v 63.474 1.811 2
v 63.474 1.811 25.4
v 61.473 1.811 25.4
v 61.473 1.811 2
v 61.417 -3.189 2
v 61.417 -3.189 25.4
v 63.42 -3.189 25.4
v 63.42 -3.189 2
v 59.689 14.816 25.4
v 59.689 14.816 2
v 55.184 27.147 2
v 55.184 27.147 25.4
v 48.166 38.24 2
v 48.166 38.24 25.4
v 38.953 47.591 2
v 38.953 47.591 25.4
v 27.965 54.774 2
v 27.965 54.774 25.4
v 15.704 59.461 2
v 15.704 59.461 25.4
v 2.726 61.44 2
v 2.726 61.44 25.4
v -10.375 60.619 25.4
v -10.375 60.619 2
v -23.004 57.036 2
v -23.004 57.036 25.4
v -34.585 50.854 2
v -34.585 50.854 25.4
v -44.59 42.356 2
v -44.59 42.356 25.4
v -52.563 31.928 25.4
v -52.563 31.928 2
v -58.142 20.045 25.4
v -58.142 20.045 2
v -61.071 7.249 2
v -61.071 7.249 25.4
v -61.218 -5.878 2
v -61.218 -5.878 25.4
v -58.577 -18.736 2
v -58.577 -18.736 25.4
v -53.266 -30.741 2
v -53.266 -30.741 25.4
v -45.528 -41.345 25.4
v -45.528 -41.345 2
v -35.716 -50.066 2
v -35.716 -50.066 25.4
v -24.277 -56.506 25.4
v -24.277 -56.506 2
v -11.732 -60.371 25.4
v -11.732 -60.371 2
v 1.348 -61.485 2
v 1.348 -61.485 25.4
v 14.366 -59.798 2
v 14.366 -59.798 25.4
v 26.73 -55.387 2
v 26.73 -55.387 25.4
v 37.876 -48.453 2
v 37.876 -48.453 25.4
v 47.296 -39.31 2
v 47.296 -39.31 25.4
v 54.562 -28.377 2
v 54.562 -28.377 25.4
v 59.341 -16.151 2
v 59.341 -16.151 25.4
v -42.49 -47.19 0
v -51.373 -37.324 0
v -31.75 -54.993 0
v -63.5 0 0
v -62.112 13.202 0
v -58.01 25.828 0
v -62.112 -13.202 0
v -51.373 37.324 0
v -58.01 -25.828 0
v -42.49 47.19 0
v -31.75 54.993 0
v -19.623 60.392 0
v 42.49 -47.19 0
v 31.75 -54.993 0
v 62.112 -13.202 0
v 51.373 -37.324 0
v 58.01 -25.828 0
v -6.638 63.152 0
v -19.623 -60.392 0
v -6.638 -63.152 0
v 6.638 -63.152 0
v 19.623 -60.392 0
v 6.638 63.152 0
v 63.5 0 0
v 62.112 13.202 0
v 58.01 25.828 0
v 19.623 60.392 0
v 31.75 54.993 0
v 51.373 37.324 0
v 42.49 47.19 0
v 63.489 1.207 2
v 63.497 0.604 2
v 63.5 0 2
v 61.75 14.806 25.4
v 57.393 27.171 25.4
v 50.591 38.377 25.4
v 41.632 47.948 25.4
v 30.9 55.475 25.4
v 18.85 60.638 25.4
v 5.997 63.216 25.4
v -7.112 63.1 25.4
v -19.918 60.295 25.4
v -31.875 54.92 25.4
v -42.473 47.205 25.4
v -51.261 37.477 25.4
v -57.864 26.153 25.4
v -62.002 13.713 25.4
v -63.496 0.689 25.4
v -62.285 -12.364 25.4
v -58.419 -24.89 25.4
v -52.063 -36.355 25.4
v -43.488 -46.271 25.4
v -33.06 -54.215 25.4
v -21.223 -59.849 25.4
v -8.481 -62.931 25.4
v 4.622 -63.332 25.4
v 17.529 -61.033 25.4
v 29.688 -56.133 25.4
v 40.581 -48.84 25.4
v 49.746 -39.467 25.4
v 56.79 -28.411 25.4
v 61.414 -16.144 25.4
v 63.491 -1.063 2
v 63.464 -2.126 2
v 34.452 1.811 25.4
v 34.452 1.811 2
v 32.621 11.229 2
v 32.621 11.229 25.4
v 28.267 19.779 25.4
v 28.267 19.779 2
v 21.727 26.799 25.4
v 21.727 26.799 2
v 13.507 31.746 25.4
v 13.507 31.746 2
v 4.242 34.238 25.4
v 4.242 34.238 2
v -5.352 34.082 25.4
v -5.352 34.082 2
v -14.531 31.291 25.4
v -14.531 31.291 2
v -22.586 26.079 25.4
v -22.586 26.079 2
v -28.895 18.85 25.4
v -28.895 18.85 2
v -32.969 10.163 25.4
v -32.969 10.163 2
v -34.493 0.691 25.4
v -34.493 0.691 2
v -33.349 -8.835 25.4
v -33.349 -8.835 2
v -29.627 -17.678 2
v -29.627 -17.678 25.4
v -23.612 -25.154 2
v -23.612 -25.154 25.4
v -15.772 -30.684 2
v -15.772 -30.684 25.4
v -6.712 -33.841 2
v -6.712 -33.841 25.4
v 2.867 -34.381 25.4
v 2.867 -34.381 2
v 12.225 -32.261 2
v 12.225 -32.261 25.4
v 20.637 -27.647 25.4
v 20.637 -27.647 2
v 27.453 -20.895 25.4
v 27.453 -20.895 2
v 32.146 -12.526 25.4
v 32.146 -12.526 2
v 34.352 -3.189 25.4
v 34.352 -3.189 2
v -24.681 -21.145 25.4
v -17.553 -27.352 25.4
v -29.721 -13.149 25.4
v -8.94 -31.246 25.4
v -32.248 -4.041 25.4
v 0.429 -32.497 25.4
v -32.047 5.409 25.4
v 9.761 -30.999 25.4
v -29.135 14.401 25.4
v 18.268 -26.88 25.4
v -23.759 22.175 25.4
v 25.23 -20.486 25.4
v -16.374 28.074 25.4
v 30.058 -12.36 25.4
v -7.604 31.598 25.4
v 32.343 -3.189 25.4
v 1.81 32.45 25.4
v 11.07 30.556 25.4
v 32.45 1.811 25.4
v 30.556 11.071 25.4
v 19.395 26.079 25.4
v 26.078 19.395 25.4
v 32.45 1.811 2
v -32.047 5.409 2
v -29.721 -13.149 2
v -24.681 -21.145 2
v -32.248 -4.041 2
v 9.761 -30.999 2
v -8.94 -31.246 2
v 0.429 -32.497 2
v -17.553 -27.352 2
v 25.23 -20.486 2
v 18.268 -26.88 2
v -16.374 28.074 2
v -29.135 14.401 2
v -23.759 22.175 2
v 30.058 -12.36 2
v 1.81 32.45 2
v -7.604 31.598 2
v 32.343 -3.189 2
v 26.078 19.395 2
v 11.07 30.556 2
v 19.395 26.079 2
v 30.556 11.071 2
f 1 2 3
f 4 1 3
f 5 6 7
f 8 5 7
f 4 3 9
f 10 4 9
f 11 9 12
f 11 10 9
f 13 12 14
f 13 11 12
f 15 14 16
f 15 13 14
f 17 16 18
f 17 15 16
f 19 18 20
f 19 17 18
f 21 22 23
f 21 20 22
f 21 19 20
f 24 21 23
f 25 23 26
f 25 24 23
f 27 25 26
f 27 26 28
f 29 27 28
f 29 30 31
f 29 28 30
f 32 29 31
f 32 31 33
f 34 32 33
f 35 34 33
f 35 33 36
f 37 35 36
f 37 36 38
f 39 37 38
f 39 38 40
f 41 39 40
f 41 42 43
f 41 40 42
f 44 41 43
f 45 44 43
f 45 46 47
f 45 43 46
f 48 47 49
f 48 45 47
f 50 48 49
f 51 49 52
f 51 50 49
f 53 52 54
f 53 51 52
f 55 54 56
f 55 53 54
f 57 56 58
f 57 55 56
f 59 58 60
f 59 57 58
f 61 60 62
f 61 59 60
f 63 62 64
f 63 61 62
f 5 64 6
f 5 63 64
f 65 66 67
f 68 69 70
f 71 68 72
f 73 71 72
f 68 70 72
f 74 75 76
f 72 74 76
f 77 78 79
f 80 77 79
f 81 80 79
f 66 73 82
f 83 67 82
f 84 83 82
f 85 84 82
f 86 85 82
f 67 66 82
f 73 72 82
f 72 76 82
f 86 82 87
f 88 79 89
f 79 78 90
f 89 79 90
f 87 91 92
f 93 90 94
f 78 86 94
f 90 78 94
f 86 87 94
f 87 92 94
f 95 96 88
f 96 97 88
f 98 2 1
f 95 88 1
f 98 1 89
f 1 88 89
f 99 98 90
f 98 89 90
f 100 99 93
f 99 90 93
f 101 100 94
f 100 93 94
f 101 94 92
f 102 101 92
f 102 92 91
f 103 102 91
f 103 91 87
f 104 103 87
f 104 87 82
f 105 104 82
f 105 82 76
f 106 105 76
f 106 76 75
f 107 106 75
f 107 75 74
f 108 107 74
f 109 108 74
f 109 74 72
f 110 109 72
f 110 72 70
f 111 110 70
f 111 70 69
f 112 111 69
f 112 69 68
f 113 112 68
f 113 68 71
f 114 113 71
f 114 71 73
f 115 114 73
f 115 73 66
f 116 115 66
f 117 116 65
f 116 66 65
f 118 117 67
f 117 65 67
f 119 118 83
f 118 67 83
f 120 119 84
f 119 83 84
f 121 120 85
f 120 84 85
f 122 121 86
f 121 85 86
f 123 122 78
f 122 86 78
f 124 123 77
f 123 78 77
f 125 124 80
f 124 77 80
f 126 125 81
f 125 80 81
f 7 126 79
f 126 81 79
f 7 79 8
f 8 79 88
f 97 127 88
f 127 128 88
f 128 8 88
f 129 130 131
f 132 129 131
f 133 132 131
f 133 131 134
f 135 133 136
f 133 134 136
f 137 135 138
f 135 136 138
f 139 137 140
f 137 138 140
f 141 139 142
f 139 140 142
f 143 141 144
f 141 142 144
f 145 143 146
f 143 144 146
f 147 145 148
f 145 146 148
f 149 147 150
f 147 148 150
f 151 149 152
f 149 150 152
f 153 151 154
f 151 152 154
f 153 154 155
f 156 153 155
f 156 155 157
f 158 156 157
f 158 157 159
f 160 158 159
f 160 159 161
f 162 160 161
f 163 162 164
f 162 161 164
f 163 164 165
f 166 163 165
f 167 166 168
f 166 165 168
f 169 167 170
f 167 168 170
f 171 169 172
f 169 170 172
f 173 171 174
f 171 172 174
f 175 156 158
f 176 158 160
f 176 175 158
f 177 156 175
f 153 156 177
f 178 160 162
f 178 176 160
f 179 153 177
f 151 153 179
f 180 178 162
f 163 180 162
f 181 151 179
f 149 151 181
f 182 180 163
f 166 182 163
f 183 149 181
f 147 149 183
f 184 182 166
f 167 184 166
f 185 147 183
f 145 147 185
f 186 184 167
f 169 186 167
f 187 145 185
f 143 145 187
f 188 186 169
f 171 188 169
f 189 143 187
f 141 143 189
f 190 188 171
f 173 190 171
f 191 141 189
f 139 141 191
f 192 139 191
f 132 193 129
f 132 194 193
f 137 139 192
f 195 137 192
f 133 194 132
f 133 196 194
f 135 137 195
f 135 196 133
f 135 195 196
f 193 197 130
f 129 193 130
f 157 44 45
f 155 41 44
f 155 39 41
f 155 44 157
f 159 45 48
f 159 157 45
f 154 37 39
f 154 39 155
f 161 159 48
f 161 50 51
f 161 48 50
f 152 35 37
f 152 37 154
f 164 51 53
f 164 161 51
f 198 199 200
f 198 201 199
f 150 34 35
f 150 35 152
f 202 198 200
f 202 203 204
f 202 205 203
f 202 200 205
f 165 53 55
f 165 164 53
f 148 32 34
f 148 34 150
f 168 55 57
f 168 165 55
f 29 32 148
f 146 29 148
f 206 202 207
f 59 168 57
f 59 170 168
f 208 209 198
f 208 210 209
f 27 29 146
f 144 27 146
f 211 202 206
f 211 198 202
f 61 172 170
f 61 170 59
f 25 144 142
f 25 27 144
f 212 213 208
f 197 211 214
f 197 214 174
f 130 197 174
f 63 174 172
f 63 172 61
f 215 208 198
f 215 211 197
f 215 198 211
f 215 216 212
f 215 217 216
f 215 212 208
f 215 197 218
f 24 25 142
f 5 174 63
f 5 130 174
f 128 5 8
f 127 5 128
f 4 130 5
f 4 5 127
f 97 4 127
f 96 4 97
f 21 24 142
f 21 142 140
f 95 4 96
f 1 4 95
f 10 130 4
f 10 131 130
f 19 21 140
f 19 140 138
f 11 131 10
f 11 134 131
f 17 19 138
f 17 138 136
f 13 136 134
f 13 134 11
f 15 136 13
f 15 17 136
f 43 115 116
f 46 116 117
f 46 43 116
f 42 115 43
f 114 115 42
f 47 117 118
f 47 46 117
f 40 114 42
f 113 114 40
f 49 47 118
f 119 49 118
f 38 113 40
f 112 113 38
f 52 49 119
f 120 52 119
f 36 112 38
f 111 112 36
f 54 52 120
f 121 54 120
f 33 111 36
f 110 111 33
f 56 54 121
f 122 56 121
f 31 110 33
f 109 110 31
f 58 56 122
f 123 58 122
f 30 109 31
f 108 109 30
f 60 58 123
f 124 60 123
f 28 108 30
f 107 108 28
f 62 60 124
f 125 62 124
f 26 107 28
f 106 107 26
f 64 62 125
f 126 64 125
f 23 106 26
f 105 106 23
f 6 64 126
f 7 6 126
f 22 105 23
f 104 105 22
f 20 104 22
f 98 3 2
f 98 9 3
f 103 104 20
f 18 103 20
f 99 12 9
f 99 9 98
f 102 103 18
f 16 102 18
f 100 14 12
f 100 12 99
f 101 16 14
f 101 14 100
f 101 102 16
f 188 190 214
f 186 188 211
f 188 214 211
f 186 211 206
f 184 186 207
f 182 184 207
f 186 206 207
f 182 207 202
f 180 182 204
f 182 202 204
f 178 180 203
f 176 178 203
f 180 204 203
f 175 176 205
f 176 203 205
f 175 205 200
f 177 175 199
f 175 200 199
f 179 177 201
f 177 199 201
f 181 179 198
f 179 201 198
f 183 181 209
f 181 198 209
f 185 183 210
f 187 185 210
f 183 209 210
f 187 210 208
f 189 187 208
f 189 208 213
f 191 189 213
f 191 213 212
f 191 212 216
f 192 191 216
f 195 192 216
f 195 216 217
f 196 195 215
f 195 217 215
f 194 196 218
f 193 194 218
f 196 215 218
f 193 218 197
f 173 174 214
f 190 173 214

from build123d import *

# Parameters (mm, degrees)
SKETCH2_R           = 63.5
BOSS_EXTRUDE1_DEPTH = 25.4
SHELL1_T            = -2
BOSS_EXTRUDE2_DEPTH = 23.4
CUT_EXTRUDE2_DEPTH  = 23.4


with BuildPart() as part:
    # Sketch2 → Boss-Extrude1 (new body)
    with BuildSketch(Plane(origin=(0, 0, 0), x_dir=(0, 1, 0), z_dir=(0, 0, 1))):
        with Locations(Location((0, 0, 0), (0, 0, 270))):
            Circle(SKETCH2_R)
    extrude(amount=BOSS_EXTRUDE1_DEPTH)

    # Shell1
    shell1_openings = [part.faces().sort_by_distance(p)[0] for p in [
        (0, 0, 25.4),
    ]]
    offset(amount=SHELL1_T, openings=shell1_openings, kind=Kind.INTERSECTION)

    # Sketch3 → Boss-Extrude2 (add)
    with BuildSketch(Plane.XY.offset(2)):
        with BuildLine():
            Line((32.449501385, 1.811038348), (34.452433007, 1.811038348))
            ThreePointArc((34.452433007, 1.811038348), (-34.49308373, 0.690778407), (34.352300121, -3.188961652))
            Line((34.352300121, -3.188961652), (32.343168113, -3.188961652))
            ThreePointArc((32.343168113, -3.188961652), (-32.492653095, 0.691010021), (32.449501385, 1.811038348))
        make_face()
    extrude(amount=BOSS_EXTRUDE2_DEPTH)

    # Sketch4 → Cut-Extrude2 (cut)
    with BuildSketch(Plane.XY.offset(25.4)):
        Polygon((34.352300121, -3.188961652), (63.419874831, -3.188961652), (70.082181446, -0.688961652), (63.474169078, 1.811038348), (34.452433007, 1.811038348), align=None)
    extrude(amount=-CUT_EXTRUDE2_DEPTH, mode=Mode.SUBTRACT)


solid = part.part
